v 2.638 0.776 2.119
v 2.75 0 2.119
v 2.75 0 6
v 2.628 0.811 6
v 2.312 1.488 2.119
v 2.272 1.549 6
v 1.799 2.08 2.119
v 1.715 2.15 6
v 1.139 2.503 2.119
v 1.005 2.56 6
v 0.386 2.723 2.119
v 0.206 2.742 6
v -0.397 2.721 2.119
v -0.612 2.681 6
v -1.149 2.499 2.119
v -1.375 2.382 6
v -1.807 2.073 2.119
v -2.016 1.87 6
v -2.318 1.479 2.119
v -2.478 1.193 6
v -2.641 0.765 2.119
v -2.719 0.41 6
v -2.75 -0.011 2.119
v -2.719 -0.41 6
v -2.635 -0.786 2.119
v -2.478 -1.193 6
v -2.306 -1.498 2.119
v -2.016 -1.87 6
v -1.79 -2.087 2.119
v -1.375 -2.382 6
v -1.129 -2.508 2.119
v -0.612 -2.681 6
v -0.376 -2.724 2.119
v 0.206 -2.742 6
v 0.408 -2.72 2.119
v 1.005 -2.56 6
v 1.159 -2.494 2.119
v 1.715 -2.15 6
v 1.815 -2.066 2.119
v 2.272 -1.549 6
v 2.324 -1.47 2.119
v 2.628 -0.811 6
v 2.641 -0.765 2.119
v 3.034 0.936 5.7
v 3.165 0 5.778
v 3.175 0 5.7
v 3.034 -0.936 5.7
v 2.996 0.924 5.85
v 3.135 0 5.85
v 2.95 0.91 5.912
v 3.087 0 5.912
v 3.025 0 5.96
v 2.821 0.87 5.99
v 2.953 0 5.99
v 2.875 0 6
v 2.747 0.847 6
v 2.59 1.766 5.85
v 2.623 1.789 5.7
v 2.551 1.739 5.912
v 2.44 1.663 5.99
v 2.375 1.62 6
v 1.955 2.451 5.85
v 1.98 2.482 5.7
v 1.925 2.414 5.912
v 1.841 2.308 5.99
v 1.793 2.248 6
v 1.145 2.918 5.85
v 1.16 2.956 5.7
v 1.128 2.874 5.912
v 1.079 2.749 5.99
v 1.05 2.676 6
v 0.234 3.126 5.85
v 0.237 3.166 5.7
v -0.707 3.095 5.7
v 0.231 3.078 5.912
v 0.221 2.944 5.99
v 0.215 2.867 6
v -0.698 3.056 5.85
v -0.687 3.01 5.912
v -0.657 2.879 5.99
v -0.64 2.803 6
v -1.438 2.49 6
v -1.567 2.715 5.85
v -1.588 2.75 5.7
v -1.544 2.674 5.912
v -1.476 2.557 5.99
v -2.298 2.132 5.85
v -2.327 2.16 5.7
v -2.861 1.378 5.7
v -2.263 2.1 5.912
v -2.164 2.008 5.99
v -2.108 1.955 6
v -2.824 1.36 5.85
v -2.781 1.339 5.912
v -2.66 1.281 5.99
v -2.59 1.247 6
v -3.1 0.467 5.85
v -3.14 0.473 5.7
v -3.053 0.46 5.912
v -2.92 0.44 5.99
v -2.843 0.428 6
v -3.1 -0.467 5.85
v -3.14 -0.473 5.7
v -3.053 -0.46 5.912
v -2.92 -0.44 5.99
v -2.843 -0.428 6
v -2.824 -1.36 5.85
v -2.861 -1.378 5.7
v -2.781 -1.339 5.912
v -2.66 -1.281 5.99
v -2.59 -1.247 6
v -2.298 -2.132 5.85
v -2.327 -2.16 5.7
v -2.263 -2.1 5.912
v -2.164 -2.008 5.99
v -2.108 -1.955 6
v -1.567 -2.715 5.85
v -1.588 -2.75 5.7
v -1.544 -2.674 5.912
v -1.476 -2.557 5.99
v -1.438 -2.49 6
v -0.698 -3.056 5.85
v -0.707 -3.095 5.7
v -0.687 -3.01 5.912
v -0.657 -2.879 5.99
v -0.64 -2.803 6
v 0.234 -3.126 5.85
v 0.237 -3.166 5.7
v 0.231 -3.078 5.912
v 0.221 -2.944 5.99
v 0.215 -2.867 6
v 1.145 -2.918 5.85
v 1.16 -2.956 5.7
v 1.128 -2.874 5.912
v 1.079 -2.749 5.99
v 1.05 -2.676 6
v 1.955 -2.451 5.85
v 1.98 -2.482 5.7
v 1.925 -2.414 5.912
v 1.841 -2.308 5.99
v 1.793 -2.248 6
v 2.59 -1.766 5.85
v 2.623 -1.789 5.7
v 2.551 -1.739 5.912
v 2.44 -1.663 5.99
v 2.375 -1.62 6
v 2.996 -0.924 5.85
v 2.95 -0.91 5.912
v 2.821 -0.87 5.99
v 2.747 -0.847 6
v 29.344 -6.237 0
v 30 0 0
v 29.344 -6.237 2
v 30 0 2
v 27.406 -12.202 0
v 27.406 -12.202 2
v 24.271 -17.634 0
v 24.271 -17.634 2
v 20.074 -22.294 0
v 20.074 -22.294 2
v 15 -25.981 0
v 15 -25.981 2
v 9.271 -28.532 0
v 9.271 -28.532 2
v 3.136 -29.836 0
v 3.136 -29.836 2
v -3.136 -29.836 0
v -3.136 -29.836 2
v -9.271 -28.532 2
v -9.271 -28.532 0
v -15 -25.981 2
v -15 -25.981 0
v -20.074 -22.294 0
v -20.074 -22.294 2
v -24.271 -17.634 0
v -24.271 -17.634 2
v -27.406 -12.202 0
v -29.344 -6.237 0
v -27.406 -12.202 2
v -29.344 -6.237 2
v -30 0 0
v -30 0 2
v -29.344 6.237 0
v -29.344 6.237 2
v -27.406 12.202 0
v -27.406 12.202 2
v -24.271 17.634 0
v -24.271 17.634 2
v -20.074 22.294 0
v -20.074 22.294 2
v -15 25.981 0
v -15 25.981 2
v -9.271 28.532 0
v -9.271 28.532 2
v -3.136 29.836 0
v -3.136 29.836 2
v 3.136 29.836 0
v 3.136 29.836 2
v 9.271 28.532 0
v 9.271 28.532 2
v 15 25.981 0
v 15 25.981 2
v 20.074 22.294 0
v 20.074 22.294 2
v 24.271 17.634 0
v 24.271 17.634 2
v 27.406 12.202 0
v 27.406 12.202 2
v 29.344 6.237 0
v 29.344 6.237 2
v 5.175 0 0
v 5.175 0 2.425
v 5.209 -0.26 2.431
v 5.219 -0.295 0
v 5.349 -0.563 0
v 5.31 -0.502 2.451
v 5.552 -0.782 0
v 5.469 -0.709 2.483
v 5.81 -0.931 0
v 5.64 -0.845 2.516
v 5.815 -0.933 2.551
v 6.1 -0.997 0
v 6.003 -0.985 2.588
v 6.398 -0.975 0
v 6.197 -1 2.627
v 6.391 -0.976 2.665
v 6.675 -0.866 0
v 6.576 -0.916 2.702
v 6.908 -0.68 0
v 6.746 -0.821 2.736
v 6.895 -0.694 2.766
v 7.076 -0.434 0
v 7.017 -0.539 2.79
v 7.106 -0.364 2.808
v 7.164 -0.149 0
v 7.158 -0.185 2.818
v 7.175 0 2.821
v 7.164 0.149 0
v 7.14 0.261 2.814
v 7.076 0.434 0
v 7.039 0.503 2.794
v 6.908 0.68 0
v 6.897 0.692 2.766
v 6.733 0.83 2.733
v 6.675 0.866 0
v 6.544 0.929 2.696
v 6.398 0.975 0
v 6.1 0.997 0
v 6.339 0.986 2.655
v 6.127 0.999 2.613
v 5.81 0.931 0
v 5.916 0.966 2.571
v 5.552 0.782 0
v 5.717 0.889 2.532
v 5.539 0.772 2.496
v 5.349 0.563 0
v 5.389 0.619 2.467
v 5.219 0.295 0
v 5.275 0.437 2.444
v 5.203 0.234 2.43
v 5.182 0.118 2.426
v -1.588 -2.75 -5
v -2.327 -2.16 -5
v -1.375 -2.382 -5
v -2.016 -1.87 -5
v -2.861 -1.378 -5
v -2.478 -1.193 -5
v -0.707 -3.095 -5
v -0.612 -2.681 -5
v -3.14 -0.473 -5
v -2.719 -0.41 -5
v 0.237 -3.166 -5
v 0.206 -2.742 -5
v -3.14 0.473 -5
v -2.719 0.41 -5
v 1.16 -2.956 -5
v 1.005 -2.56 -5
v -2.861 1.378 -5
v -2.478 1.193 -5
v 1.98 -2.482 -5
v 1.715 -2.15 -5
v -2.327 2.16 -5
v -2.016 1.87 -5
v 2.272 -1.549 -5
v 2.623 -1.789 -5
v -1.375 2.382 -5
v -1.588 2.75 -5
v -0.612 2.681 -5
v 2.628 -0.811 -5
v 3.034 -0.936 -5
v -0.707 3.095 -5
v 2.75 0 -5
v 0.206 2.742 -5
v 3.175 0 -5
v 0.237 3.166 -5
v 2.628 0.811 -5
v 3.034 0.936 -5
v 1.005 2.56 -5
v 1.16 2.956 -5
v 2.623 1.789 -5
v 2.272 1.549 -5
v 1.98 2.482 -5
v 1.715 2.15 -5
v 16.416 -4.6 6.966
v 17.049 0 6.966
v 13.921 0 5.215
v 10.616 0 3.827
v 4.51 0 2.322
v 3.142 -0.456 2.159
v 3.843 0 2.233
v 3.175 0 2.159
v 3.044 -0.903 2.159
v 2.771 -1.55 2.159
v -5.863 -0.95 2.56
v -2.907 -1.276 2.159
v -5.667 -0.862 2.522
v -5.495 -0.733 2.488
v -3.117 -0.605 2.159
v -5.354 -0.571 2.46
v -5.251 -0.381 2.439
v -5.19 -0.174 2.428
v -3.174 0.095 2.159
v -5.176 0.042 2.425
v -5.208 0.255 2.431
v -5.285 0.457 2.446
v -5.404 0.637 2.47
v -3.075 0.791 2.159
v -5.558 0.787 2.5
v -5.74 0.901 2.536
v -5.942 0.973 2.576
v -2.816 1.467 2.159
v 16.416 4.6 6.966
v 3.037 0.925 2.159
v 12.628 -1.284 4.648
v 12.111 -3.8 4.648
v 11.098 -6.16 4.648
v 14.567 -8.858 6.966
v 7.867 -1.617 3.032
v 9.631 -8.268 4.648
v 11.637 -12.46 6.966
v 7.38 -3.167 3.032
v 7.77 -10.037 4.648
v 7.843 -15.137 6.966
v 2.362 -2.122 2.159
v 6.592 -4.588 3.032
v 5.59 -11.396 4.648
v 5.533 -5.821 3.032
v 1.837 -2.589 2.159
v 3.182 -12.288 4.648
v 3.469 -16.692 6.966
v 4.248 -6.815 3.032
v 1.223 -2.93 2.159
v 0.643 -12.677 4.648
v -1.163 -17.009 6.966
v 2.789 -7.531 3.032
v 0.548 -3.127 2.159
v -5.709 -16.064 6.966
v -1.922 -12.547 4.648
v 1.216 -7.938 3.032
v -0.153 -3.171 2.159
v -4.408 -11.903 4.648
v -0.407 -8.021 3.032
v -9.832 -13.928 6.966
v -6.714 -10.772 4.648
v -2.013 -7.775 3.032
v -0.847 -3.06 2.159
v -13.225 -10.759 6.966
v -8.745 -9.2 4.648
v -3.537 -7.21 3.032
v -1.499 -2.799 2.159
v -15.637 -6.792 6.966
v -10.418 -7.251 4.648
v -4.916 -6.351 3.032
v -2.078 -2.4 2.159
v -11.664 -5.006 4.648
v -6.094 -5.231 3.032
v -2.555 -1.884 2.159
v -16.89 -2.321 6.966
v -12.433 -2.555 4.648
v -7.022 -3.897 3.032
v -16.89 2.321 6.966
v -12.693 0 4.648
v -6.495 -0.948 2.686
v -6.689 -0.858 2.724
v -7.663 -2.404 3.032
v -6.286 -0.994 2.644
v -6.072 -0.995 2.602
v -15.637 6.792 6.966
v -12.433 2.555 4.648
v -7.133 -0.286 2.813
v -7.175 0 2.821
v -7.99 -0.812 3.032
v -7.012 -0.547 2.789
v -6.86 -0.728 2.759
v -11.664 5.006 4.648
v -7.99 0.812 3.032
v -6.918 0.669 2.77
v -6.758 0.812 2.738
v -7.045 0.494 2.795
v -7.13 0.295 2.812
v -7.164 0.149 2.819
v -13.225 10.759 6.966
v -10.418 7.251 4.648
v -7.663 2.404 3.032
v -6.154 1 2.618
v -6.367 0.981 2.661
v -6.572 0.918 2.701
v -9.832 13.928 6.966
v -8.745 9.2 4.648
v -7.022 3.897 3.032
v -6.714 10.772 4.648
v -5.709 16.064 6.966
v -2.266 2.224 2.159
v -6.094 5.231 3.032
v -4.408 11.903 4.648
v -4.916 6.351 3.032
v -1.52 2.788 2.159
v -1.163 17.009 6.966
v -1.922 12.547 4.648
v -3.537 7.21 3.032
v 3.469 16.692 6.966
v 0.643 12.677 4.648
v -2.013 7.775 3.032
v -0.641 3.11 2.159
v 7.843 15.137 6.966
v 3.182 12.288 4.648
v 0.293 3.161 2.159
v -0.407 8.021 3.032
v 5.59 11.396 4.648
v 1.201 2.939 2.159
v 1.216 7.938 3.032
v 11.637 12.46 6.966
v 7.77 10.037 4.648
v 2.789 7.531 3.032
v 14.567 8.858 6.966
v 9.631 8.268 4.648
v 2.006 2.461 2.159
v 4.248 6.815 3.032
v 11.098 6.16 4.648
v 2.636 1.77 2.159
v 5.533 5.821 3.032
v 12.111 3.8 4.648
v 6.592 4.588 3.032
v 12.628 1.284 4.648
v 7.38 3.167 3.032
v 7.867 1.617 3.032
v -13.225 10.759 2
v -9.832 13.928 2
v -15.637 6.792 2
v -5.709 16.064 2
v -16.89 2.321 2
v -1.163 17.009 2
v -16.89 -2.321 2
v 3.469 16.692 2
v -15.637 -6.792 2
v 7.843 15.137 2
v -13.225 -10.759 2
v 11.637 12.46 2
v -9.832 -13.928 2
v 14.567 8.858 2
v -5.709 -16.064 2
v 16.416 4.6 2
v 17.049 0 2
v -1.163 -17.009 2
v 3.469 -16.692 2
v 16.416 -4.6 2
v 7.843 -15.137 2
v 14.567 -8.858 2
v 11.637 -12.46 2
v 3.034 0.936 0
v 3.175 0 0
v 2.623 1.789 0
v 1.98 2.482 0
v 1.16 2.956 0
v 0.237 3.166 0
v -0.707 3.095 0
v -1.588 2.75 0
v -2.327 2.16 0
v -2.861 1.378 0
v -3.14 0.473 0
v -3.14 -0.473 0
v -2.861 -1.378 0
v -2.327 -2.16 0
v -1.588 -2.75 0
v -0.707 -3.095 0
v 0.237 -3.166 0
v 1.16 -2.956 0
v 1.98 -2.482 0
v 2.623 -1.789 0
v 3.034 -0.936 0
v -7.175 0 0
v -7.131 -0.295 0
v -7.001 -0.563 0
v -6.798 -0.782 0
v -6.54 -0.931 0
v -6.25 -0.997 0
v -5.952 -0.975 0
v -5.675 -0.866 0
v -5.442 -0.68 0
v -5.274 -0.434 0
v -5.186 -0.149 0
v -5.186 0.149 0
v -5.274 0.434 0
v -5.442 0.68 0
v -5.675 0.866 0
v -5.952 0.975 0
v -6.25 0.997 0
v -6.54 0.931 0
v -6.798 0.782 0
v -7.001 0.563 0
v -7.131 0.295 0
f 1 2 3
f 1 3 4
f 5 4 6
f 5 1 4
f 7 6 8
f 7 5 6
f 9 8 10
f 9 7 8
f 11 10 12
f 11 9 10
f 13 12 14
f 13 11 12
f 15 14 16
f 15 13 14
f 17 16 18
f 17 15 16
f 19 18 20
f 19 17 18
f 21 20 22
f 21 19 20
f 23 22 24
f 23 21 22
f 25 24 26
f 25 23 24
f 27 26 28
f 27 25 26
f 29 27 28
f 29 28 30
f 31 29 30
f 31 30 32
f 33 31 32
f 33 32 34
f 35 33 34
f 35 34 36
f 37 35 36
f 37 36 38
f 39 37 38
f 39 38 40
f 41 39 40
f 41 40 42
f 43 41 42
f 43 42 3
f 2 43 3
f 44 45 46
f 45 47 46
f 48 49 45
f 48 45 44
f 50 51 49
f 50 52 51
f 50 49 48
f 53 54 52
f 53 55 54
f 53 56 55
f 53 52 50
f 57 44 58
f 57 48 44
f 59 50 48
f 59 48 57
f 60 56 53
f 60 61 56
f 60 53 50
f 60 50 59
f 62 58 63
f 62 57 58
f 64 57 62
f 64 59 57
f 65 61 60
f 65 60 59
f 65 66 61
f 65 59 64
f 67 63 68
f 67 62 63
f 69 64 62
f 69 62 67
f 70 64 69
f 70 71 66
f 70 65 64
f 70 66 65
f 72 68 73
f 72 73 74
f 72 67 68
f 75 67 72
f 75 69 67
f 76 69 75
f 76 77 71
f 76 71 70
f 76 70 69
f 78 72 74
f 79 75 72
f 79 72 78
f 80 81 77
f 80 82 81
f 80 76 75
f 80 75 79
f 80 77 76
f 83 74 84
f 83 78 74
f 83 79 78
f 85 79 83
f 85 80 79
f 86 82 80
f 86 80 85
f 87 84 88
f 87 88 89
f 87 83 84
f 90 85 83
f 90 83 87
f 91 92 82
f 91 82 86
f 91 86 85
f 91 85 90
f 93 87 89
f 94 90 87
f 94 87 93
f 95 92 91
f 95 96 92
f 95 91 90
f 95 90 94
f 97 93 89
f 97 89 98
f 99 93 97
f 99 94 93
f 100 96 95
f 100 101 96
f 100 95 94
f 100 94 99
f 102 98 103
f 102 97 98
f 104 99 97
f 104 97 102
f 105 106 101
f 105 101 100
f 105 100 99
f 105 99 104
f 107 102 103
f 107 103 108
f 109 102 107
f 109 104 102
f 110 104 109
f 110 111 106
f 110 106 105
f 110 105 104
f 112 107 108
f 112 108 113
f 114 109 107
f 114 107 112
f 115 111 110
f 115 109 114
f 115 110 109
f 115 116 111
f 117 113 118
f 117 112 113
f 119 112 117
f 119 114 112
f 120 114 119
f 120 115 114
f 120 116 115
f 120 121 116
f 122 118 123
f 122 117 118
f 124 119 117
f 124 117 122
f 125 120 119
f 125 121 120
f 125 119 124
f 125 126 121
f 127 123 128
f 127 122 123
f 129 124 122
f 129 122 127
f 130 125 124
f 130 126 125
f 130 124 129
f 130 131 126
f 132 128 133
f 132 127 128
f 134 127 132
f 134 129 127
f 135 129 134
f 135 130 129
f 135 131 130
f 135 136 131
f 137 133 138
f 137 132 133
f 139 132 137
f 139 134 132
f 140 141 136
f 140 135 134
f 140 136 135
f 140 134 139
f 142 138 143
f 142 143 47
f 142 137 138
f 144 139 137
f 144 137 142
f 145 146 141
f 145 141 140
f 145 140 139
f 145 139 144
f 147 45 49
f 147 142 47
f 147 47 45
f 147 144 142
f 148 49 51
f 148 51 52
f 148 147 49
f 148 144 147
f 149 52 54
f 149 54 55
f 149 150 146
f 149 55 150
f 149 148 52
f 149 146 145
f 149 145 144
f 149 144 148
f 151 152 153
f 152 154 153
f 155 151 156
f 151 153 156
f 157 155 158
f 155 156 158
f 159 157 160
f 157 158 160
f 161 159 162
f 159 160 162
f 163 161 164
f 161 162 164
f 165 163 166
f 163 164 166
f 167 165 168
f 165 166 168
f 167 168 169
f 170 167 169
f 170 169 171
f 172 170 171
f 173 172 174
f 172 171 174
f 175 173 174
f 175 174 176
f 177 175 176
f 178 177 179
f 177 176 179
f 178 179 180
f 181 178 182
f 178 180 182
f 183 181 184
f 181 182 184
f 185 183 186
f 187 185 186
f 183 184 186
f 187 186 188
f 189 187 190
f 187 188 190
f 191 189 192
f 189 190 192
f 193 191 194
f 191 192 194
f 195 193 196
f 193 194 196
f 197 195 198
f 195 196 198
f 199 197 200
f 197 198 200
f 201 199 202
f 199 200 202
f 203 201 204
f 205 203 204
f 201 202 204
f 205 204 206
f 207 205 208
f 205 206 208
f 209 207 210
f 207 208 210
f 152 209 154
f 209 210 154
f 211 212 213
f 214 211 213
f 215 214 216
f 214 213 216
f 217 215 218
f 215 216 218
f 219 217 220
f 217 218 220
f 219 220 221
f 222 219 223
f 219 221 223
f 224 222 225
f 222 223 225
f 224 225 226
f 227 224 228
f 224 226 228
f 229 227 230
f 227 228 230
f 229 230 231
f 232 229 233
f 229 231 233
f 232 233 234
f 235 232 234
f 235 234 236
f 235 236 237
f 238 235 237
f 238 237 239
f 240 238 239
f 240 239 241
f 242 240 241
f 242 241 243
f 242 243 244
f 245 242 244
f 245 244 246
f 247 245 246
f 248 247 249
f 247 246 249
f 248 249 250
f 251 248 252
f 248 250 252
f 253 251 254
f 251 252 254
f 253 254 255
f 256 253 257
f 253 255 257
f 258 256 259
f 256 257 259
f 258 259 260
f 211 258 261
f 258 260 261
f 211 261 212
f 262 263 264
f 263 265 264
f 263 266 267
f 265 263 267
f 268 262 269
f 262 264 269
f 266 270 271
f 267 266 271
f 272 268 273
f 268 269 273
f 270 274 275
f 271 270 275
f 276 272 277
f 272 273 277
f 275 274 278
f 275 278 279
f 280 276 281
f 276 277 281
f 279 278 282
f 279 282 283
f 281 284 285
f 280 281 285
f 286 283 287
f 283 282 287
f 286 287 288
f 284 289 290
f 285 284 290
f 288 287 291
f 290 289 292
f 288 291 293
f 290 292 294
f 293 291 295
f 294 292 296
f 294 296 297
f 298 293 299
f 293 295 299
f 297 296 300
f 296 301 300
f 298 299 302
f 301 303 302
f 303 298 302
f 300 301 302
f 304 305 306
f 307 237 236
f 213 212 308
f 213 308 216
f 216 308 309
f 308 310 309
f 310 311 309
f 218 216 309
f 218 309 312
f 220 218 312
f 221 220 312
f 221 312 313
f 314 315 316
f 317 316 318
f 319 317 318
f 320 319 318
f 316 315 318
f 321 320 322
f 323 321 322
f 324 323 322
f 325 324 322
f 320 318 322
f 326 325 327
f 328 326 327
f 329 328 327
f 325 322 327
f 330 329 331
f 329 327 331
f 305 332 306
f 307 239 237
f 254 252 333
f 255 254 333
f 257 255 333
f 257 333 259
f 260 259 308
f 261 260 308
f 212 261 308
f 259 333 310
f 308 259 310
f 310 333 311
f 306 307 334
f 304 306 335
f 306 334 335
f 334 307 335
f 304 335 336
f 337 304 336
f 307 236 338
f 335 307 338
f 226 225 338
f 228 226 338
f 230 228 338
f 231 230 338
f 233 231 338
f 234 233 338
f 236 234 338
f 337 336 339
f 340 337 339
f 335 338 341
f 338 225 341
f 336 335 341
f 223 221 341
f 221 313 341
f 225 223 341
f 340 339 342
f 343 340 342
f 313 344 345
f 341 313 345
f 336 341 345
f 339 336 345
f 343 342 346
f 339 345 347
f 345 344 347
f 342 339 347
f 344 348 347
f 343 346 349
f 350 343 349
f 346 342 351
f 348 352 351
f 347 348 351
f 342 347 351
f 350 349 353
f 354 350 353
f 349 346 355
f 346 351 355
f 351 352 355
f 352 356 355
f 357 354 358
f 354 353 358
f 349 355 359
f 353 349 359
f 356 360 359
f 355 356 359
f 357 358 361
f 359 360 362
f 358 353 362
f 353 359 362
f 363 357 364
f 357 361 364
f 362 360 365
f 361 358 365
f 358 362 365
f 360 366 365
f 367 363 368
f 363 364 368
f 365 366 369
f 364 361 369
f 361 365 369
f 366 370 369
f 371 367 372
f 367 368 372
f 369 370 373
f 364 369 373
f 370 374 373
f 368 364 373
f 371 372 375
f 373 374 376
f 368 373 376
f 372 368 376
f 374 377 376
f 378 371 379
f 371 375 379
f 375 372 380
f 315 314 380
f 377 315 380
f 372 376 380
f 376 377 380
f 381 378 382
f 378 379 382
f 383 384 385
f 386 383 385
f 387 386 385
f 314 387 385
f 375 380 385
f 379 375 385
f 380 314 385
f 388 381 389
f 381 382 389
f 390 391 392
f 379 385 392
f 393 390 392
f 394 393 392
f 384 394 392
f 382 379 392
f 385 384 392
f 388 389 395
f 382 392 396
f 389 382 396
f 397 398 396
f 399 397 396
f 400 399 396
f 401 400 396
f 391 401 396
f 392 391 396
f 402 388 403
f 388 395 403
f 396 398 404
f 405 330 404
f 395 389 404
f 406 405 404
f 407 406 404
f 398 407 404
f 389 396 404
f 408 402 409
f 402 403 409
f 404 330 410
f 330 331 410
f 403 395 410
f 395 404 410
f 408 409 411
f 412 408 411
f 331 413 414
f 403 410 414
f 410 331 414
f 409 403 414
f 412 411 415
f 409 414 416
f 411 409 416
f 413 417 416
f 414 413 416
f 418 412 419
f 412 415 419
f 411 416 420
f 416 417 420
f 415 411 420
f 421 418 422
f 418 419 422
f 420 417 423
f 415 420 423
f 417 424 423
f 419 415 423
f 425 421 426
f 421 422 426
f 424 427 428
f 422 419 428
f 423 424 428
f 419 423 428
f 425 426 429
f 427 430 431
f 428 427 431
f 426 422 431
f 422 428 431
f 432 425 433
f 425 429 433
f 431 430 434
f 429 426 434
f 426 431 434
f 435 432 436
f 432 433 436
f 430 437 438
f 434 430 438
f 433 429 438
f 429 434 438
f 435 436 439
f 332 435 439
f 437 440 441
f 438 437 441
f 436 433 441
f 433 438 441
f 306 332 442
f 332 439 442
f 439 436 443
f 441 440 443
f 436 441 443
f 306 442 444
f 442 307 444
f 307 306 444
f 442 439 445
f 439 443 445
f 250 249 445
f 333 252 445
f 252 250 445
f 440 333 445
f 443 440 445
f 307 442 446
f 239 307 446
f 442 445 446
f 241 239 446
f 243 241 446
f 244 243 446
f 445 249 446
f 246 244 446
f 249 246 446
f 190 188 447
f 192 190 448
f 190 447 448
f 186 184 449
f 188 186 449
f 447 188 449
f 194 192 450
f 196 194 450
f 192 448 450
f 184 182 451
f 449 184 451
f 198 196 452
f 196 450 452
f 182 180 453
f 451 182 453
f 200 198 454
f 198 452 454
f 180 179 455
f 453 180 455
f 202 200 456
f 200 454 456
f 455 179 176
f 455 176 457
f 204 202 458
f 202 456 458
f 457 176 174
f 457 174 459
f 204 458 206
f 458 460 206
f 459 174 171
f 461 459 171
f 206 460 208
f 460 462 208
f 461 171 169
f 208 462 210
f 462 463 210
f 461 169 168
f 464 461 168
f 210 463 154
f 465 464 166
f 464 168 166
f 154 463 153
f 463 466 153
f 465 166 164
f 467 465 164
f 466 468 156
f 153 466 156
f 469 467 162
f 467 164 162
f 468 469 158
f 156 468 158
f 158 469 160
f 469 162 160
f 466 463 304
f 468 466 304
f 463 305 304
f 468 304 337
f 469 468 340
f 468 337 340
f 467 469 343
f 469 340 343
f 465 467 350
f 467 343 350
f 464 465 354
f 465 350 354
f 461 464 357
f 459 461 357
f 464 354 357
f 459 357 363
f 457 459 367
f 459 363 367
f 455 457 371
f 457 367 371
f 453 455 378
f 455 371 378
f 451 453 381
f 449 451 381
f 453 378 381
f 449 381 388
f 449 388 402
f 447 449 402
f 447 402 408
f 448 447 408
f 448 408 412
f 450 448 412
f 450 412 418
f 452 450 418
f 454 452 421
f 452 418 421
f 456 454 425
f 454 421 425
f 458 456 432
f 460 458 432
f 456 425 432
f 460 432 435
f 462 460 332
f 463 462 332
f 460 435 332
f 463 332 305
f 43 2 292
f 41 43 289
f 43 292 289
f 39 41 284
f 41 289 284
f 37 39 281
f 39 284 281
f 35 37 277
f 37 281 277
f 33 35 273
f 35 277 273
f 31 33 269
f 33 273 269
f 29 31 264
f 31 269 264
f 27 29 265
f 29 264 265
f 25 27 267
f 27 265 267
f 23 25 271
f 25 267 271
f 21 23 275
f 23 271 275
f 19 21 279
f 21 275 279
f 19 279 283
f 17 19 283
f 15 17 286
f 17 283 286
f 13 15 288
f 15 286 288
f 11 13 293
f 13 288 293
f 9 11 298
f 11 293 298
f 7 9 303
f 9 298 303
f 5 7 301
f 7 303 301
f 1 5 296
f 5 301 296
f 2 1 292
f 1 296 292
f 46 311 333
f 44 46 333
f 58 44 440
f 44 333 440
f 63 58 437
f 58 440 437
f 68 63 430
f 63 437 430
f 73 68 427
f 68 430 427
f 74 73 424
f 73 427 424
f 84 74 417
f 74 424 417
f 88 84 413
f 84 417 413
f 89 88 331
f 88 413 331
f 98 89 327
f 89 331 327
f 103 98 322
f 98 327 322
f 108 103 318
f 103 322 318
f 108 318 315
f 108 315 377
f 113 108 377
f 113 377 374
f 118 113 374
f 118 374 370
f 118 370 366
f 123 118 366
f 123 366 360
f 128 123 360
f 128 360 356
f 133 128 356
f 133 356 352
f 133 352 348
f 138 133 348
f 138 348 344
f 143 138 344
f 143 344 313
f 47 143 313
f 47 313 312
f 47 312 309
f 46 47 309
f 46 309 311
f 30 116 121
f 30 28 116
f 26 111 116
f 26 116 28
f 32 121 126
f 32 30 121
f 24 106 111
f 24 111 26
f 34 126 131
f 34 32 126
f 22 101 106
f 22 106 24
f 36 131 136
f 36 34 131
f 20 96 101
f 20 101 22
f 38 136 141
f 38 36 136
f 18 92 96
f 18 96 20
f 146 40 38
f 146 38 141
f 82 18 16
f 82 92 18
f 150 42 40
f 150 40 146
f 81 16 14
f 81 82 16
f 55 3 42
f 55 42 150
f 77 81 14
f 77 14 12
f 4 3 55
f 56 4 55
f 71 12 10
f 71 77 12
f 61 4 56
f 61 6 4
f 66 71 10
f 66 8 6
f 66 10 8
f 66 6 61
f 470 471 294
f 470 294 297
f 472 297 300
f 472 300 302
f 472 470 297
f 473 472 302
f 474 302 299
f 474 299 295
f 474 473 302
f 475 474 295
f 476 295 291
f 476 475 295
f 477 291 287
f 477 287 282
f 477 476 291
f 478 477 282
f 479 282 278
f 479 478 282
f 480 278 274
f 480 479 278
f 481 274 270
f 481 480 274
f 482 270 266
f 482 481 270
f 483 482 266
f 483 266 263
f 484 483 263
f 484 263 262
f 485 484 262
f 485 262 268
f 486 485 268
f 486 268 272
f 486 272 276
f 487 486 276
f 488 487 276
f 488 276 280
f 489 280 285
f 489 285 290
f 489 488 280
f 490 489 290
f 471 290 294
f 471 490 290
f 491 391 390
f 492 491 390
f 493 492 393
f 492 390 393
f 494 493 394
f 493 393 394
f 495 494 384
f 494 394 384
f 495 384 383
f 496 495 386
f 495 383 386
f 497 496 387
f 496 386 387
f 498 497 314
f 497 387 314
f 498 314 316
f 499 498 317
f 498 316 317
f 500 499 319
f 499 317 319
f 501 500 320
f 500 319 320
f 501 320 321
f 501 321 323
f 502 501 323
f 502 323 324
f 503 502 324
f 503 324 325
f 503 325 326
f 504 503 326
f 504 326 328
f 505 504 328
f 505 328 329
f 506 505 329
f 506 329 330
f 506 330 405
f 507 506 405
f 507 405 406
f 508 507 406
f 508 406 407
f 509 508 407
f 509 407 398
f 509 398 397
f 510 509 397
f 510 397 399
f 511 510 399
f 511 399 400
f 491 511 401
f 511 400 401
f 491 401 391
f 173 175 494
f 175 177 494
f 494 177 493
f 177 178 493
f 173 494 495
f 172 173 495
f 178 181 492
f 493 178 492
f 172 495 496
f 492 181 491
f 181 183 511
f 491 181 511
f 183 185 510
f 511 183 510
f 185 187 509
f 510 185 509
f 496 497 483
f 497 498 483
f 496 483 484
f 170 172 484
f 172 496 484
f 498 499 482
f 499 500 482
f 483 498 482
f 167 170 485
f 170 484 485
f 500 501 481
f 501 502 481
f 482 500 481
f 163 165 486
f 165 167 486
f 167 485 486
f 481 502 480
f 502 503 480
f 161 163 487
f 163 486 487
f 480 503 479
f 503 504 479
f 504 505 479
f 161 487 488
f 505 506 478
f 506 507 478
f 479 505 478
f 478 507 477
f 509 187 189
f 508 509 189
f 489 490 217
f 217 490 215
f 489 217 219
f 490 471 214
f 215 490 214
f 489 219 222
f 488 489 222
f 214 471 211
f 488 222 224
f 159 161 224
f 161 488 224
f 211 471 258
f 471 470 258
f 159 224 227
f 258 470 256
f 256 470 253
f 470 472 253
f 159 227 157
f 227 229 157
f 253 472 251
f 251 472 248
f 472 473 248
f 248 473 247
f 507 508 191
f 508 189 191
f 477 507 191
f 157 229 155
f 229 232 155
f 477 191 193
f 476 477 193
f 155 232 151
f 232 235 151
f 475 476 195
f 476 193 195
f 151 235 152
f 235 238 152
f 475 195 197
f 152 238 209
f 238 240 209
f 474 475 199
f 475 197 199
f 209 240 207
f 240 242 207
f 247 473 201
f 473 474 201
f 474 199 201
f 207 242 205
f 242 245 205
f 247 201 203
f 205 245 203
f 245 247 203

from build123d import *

# Parameters (mm, degrees)
F2_R          = 3.175
F2_R_2        = 2.75
F3_DEPTH      = 6
F3_DEPTH_BACK = 5
F4_R          = 0.3
F5_R          = 2.75
F6_DEPTH      = 6.966563666
F8_D          = 2


with BuildPart() as f1:
    # F0 (on Front) → F1 (revolve)
    with BuildSketch(Plane.XZ):
        Polygon((0, 2), (0, 0), (30, 0), (30, 2), (17.0486500744, 2), align=None)
        with BuildLine():
            ThreePointArc((17.0486500744, 6.965563649), (8.8785315808, 3.2666573852), (1.21e-08, 2))
            Line((1.21e-08, 2), (17.0486500744, 2))
            Line((17.0486500744, 2), (17.0486500744, 6.965563649))
        make_face()
    revolve(axis=Axis((0, 0, 32.75), (0, 0, -1)))

    # F2 (on Top) → F3 (join, two sides)
    with BuildSketch(Plane.XY) as f3_sk:
        Circle(F2_R)
        Circle(F2_R_2, mode=Mode.SUBTRACT)
    extrude(amount=F3_DEPTH)
    extrude(f3_sk.sketch, amount=-F3_DEPTH_BACK)

    # F4
    f4_edges = [f1.edges().sort_by_distance(p)[0] for p in [
        (-3.175, 0, 6),
    ]]
    fillet(f4_edges, radius=F4_R)

    # F5 (on face) → F6 (cut, through all)
    with BuildSketch(Plane(origin=(0, 0, 0), x_dir=(1, 0, 0), z_dir=(0, 0, -1))):
        Circle(F5_R)
    extrude(amount=-F6_DEPTH, mode=Mode.SUBTRACT)

    # F8 (through all)
    with Locations(Plane(origin=(0, 0, 0), x_dir=(1, 0, 0), z_dir=(0, 0, -1))):
        with Locations((-6.175, 0), (6.175, 0)):
            Hole(F8_D / 2)


solid = f1.part
